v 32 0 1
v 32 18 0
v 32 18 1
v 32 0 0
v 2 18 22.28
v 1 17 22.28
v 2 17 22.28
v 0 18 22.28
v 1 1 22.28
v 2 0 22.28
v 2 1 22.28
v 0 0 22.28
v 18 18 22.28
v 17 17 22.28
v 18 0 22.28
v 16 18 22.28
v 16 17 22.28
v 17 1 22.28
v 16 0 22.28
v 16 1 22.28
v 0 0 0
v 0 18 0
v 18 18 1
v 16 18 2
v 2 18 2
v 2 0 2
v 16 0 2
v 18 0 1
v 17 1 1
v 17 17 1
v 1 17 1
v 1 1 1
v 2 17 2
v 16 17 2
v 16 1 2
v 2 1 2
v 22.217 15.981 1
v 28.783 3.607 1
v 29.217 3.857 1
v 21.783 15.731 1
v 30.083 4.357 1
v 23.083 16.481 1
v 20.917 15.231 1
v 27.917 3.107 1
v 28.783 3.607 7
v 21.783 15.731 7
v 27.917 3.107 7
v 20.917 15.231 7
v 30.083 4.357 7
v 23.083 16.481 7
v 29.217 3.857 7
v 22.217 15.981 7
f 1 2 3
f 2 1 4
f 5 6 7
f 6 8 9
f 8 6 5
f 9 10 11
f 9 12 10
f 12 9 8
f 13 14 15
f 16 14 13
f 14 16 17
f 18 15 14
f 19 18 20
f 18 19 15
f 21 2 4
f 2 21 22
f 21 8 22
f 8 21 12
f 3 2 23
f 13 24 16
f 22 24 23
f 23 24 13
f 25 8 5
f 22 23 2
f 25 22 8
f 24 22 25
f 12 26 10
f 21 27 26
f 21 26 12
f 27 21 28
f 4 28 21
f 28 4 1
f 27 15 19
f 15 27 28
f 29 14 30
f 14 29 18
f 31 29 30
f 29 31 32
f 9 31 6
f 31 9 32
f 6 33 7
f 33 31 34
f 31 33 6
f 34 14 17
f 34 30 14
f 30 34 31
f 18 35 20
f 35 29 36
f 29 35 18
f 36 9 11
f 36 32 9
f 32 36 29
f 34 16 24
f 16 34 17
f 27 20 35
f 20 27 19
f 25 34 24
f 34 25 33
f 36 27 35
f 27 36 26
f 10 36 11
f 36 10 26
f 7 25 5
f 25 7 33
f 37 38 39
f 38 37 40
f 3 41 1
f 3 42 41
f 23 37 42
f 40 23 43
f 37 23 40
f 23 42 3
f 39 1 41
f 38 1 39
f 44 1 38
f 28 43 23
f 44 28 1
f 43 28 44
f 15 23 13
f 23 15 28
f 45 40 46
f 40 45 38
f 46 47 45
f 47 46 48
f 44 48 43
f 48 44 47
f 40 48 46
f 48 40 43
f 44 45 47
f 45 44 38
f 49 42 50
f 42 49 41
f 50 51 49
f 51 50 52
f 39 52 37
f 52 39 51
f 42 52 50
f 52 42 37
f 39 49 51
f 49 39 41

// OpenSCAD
size_cube = 16 ;

t = 1;

size_x = 2*size_cube;
size_y = size_cube+2*t;
size_z = size_cube*(1+0.33)+t;

difference() {
    cube([size_x, size_y, size_z]);
    translate([t, t, t]) cube([size_cube, size_cube, size_z]);
    translate([2*t, 0, 2*t]) cube([size_cube-2*t, size_y, size_z]);
    translate([2*t+size_cube, 0, t]) cube([size_x, size_y, size_z]);
}

translate([30, 2, 0]) {
    rotate([0, 0, 30]) {
        union() {
            translate([-0.75, size_y/2, t+3]) cube([1, 14, 6], true);
            translate([0.75, size_y/2, t+3]) cube([1, 14, 6], true);
        }
    }
}
